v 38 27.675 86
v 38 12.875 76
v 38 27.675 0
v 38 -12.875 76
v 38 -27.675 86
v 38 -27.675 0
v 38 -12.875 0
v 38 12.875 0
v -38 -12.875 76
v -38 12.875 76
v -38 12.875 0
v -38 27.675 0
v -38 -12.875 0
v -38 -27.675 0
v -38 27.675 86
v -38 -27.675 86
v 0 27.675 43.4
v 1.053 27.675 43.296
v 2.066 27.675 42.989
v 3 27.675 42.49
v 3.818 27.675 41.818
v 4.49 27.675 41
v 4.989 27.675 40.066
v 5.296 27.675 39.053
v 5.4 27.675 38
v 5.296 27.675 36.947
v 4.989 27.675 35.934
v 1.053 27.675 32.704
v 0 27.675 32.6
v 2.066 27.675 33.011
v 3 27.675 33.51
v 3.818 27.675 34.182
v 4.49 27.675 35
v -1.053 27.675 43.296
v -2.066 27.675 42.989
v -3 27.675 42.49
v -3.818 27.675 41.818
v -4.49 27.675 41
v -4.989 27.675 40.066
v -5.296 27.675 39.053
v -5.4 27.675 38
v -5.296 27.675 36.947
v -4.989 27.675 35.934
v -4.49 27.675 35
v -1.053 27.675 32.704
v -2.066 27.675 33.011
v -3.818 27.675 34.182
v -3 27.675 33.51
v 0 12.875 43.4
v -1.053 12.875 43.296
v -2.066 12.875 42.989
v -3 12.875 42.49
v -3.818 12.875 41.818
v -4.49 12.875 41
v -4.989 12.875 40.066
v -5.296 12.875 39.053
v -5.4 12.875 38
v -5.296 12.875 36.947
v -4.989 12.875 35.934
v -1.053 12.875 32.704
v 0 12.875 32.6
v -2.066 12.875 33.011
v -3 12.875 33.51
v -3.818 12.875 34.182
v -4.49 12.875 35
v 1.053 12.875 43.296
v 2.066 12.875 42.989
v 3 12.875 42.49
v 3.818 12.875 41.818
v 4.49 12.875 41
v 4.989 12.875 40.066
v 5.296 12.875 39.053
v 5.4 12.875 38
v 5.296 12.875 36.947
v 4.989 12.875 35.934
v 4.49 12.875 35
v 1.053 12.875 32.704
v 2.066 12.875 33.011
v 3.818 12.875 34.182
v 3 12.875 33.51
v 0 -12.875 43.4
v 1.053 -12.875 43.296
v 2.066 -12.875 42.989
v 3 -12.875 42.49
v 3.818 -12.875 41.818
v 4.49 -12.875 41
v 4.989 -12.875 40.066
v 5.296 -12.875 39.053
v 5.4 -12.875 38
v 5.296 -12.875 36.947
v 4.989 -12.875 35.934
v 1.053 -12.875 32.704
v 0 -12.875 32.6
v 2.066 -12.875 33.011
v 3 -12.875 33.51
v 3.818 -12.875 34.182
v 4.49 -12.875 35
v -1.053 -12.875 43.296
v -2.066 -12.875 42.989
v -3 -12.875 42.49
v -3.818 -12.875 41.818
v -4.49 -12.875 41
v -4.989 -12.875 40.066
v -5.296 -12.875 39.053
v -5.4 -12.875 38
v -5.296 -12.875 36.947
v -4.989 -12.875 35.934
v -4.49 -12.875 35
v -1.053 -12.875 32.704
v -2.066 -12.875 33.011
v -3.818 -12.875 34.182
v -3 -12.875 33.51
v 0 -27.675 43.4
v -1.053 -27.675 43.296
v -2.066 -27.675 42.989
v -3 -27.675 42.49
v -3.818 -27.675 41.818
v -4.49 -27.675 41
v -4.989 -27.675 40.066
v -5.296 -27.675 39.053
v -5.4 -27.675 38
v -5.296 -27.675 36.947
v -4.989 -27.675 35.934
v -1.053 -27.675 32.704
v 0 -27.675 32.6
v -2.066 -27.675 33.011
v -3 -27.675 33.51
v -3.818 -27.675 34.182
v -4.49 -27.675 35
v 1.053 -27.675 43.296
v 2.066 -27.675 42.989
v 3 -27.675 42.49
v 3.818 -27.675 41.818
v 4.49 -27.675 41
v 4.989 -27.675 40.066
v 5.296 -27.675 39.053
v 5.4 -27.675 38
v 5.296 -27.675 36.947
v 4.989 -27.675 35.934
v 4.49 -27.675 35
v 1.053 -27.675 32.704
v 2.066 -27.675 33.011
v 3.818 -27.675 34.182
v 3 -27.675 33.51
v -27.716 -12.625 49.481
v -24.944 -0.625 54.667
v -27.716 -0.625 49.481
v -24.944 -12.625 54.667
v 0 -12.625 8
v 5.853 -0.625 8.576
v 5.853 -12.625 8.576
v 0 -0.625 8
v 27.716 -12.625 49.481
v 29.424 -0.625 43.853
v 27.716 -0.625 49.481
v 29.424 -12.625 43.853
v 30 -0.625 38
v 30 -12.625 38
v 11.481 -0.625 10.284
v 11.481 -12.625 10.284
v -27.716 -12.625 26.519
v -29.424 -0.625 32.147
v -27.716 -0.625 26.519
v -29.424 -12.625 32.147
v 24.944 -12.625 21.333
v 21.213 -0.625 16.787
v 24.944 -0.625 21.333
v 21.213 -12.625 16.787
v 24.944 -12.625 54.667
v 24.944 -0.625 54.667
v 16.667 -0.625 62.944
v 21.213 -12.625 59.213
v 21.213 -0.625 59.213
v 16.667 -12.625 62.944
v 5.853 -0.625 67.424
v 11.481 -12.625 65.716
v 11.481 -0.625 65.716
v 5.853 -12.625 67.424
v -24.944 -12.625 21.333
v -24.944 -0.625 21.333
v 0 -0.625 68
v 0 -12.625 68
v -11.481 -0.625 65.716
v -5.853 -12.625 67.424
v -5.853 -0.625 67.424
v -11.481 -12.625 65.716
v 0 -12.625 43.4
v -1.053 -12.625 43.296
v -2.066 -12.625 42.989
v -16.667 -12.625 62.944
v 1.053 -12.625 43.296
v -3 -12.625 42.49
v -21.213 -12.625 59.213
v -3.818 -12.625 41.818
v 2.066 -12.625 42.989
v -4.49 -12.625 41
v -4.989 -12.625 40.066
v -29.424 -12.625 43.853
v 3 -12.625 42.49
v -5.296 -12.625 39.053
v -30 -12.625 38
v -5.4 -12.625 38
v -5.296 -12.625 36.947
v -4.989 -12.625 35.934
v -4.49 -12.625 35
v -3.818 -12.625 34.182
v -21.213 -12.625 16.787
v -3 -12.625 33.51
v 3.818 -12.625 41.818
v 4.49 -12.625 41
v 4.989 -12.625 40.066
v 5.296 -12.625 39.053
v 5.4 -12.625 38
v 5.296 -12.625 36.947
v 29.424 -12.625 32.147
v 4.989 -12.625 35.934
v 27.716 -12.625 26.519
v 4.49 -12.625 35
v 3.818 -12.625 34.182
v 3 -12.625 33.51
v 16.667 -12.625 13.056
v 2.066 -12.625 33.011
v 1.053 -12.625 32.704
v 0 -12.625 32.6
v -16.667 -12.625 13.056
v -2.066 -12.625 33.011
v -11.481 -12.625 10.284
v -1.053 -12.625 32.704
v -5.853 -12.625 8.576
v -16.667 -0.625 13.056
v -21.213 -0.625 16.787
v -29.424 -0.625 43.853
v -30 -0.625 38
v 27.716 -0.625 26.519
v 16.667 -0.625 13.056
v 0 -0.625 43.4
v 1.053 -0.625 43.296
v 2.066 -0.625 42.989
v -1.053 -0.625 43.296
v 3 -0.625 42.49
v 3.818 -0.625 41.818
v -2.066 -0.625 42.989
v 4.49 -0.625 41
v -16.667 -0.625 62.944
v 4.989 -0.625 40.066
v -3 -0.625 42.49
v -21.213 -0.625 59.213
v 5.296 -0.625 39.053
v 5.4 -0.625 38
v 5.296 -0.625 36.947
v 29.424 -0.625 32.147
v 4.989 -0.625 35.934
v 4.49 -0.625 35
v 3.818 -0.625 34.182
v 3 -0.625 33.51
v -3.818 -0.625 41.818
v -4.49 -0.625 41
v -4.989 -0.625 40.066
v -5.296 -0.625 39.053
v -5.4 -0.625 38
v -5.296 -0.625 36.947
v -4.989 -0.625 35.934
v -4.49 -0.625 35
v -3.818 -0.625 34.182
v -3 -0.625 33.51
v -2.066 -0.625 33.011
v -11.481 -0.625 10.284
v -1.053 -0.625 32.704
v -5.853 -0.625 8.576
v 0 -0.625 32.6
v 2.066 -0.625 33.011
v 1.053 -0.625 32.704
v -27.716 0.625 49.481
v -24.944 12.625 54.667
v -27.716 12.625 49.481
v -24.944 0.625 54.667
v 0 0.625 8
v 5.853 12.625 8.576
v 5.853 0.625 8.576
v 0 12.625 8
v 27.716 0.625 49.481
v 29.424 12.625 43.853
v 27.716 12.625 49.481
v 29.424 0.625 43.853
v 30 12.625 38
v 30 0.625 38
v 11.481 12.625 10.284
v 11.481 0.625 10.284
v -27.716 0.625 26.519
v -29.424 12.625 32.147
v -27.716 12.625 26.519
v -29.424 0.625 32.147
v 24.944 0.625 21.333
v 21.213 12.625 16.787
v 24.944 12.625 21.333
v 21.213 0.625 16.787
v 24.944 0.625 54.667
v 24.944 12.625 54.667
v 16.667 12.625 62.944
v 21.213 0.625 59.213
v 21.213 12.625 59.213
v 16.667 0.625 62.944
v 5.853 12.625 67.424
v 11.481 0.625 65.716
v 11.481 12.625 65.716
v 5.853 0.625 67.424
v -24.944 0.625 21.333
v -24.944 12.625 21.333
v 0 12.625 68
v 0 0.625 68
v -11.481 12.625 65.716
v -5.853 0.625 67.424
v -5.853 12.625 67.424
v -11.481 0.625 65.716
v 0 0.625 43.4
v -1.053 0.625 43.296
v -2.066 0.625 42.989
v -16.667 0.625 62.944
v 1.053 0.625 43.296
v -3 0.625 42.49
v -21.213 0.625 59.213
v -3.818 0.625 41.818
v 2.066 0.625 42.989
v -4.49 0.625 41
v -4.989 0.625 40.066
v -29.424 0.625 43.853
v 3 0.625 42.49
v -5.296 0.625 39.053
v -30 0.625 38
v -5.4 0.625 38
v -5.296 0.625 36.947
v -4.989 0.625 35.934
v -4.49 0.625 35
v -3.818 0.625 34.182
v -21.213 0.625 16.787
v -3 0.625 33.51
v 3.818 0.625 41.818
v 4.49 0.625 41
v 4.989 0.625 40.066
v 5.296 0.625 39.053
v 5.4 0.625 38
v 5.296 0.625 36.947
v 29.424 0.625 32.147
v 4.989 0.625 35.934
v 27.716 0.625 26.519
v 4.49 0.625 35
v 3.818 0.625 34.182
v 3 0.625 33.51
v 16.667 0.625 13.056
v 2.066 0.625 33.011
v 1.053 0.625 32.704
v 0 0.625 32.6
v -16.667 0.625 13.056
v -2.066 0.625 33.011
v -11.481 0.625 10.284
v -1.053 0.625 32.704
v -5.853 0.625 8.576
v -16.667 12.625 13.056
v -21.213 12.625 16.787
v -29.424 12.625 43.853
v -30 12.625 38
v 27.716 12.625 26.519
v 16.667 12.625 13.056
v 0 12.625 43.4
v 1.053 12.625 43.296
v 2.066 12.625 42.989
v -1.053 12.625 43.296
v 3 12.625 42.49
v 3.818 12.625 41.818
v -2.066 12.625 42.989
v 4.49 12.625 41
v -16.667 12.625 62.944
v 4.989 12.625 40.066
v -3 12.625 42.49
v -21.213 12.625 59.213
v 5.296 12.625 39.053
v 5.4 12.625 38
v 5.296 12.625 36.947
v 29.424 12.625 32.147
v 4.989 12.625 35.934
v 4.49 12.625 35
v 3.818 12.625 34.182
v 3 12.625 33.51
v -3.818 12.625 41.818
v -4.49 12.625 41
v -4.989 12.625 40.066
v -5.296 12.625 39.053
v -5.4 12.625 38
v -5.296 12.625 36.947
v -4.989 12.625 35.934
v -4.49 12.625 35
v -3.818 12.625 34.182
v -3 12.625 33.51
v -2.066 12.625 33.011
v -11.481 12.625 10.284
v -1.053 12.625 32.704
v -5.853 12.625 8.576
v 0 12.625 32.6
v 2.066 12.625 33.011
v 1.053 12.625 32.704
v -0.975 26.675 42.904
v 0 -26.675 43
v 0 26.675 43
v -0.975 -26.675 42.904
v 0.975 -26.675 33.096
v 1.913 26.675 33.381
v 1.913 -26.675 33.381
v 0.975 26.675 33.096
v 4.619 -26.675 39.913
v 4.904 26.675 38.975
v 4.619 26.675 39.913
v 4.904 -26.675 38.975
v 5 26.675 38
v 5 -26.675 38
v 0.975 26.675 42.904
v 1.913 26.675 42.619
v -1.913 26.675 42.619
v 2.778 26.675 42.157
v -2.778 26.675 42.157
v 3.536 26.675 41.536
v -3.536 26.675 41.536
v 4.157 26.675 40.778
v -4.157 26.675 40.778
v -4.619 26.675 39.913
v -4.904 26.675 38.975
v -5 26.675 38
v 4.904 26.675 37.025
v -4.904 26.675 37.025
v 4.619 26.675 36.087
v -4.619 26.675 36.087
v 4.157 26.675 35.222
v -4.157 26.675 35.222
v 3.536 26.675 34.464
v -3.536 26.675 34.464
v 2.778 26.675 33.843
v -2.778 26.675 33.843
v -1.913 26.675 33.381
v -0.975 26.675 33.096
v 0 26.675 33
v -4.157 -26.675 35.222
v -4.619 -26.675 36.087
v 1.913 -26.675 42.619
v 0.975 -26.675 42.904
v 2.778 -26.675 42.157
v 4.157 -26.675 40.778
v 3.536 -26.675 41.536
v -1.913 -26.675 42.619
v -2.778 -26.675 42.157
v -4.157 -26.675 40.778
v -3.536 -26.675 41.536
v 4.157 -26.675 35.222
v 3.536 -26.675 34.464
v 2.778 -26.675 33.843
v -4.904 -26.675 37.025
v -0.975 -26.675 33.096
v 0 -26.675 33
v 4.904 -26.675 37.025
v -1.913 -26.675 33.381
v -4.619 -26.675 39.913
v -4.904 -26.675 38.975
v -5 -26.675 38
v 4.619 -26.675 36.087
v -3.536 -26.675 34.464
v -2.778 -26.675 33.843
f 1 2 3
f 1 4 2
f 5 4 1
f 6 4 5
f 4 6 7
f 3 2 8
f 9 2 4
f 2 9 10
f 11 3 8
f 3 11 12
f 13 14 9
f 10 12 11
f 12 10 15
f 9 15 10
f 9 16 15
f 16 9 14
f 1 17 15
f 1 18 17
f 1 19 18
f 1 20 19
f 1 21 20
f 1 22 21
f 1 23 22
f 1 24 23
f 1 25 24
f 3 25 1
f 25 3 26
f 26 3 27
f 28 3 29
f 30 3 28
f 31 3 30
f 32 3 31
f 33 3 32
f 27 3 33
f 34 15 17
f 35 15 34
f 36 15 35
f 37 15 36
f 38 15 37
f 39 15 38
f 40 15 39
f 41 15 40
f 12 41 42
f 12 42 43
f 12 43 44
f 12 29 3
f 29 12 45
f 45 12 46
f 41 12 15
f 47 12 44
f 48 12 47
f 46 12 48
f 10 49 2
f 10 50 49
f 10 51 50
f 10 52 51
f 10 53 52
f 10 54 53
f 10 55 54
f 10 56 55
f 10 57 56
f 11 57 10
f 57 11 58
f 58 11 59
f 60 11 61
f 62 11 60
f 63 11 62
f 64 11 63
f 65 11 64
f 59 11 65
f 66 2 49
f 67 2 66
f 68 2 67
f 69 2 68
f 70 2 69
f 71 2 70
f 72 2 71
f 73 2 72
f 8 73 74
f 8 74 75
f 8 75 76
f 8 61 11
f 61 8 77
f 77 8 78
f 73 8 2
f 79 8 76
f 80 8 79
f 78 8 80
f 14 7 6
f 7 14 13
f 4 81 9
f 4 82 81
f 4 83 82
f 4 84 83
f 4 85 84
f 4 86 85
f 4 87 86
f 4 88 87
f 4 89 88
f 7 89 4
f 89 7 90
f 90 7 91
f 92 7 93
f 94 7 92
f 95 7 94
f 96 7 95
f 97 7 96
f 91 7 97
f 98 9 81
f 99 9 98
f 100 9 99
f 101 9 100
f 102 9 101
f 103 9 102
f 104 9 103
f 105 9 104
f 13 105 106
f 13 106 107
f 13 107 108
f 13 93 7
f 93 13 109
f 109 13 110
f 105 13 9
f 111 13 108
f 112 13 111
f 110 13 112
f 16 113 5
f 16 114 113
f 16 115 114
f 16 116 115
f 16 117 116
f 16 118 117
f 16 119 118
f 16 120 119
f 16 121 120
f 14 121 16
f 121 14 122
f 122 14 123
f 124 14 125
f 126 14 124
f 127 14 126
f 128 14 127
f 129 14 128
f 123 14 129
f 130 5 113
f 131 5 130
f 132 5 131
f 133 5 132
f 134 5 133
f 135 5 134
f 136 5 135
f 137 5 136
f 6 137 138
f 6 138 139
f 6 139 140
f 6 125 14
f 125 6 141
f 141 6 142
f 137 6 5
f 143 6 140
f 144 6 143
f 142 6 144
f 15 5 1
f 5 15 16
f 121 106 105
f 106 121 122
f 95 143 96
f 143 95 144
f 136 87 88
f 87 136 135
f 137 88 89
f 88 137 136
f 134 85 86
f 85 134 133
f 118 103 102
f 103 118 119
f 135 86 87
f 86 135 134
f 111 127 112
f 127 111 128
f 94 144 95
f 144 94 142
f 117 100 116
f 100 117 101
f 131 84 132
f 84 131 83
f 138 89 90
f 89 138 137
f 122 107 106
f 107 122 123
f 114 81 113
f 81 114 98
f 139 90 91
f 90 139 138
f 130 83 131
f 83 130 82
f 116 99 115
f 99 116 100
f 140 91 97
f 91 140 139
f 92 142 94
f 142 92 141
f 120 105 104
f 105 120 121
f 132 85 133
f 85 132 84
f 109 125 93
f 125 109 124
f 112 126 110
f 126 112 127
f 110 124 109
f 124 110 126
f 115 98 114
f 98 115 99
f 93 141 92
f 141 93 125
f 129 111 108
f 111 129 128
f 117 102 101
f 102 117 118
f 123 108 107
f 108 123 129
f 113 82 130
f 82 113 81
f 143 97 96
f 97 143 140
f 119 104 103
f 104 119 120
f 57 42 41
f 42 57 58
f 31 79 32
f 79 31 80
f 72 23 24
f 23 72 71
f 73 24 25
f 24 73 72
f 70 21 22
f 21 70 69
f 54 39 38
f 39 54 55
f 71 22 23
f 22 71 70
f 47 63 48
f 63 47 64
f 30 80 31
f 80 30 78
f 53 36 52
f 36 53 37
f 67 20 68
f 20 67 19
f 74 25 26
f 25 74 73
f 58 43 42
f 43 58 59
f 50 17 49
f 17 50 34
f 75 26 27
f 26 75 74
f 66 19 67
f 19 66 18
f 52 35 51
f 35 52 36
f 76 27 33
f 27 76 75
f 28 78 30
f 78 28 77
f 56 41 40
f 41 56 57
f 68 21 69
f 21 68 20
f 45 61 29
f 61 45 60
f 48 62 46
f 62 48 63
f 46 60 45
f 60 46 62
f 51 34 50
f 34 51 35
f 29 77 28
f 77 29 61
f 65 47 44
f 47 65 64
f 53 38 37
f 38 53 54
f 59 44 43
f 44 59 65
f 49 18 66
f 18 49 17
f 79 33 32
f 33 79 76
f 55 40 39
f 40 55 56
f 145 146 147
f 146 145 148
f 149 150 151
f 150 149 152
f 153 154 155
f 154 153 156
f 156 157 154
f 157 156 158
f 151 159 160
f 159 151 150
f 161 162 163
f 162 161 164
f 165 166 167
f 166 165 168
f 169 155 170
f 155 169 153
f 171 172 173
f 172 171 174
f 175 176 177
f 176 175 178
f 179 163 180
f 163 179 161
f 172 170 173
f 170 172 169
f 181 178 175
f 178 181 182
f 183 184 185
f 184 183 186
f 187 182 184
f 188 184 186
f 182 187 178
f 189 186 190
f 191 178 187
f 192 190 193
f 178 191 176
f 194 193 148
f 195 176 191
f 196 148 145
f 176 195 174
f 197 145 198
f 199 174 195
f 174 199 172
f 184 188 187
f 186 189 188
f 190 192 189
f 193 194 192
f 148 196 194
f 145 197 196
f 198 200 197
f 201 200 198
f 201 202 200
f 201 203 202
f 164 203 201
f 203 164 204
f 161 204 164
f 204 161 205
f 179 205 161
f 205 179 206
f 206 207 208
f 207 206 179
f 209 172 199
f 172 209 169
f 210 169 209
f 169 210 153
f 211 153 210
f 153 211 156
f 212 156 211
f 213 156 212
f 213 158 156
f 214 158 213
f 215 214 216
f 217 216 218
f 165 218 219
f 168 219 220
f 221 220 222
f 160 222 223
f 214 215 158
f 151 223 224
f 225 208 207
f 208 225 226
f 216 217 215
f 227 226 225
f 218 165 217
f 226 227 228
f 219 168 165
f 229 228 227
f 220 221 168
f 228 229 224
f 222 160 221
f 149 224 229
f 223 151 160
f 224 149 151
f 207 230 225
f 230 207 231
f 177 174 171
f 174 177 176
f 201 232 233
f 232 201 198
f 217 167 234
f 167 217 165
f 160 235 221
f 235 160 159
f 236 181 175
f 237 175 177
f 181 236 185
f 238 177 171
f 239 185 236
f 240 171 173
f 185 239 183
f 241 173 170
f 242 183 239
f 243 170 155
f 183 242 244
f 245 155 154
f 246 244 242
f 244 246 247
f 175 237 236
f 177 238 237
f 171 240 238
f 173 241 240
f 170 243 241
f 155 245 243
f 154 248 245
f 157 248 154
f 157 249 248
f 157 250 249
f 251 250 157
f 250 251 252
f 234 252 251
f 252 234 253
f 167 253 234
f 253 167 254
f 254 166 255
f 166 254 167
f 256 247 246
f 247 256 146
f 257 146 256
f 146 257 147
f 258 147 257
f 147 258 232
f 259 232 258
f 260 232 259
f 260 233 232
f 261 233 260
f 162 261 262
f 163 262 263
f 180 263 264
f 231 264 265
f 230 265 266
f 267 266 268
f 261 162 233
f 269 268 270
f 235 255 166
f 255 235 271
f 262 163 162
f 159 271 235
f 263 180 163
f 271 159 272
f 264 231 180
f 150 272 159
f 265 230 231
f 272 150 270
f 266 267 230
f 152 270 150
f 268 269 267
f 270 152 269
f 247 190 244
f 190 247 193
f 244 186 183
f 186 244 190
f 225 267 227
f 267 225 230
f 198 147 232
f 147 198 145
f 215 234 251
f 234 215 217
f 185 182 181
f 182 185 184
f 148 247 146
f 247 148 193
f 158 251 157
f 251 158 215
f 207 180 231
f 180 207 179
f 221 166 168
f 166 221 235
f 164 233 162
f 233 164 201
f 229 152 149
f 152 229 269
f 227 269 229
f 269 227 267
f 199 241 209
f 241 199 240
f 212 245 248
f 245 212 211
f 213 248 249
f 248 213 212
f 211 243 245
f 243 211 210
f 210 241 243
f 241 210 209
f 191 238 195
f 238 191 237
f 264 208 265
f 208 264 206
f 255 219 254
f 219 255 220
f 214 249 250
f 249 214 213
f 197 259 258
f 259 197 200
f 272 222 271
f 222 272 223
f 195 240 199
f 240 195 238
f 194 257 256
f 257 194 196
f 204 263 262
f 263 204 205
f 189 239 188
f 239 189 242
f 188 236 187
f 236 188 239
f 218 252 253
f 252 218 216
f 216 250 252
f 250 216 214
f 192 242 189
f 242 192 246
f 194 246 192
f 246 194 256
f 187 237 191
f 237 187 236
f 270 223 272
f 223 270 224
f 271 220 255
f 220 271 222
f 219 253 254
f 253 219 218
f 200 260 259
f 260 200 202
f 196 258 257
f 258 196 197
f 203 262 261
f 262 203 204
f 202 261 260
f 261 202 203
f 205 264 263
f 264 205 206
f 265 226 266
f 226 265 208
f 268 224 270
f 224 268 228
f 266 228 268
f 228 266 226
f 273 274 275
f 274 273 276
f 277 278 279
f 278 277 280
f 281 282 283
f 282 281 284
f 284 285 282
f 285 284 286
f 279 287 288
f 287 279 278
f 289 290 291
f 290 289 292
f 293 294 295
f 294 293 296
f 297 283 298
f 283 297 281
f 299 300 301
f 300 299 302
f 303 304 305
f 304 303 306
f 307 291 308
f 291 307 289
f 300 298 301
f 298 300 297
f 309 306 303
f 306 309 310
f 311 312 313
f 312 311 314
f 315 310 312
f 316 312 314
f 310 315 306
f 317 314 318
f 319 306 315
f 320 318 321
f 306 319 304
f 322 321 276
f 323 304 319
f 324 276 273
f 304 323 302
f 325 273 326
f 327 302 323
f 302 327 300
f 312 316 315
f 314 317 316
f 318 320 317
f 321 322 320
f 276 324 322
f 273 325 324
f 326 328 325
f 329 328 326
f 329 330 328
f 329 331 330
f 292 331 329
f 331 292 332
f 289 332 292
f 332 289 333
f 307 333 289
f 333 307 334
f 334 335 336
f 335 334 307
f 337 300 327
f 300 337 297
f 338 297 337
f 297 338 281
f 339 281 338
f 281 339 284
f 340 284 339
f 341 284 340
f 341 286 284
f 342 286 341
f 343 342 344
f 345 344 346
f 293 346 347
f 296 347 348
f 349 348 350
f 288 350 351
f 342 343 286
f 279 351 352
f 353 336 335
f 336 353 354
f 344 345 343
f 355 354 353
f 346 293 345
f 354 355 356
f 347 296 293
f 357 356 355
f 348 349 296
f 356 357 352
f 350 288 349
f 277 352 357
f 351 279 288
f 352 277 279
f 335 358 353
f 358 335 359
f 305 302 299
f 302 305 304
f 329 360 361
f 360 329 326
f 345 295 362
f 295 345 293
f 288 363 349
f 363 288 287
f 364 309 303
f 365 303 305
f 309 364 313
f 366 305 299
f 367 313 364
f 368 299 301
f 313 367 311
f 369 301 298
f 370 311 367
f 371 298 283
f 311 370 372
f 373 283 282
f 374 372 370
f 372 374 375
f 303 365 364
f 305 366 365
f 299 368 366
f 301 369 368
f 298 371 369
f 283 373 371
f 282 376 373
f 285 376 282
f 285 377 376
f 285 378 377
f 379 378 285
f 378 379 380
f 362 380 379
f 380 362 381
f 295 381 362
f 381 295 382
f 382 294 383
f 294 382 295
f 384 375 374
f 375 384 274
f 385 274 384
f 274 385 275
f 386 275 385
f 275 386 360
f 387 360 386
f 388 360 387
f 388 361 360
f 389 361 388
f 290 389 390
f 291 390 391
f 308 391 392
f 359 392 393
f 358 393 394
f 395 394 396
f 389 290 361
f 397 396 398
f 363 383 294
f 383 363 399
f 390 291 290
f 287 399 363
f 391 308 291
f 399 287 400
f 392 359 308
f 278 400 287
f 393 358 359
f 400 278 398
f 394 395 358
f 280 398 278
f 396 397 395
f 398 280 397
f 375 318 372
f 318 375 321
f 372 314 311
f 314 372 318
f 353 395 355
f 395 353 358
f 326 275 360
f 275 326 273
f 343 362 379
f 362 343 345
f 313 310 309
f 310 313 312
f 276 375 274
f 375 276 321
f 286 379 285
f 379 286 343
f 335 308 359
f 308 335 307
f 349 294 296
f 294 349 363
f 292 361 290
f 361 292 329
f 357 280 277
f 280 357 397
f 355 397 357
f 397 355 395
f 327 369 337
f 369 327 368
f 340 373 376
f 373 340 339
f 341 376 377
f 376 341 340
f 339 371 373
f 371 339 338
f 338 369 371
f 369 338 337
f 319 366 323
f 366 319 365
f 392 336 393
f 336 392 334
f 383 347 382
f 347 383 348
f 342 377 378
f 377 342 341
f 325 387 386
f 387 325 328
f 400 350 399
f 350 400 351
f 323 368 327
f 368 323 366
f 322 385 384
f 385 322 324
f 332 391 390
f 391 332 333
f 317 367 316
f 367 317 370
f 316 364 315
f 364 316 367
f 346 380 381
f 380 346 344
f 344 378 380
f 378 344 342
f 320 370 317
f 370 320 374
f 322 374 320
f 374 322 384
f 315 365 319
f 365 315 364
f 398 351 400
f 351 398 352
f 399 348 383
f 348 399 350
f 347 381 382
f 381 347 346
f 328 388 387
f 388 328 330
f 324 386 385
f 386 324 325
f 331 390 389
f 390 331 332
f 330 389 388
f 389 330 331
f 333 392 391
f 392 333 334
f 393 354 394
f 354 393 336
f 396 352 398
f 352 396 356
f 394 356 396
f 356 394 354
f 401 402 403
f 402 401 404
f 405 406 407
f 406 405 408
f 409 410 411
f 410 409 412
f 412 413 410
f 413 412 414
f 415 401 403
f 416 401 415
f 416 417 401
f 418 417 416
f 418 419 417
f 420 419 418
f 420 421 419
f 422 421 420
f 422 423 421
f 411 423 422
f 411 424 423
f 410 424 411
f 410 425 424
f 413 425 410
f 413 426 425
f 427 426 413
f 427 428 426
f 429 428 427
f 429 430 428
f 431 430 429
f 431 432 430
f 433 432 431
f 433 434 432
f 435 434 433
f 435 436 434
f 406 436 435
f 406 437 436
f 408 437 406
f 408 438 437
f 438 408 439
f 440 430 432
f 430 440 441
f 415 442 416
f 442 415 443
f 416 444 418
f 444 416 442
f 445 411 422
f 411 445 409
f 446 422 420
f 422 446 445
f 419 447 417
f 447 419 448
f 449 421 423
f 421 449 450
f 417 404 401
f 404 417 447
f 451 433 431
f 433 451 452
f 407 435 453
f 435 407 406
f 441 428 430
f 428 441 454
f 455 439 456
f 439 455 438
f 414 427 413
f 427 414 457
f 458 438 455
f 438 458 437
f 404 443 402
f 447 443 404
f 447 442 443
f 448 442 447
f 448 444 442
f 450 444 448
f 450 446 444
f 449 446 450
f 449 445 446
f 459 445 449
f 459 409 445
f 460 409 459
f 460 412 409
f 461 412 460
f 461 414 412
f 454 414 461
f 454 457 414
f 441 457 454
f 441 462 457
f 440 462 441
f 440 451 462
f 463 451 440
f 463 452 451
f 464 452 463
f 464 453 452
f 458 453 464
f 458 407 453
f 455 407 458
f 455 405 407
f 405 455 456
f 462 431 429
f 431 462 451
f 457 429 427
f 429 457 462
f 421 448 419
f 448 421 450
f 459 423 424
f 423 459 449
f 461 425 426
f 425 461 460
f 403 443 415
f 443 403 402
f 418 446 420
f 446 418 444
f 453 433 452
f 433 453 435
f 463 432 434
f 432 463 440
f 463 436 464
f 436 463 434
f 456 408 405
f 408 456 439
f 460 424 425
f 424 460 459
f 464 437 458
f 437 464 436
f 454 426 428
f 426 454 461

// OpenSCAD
$fn = 32;

// ------------------------------------------------------------------------
// Trolley wheel set: wheels d60, fork 76 mm tall
// Every part is its own module, assembly() places every instance.
// ------------------------------------------------------------------------

// --- part 1 ---
module trolley_fork() {
  difference() {
    union() {
      translate([-38, 12.875, 0]) cube([76, 14.8, 76]);
      translate([-38, -27.675, 0]) cube([76, 14.8, 76]);
      translate([-38, -27.675, 76]) cube([76, 55.35, 10]);
    }
    translate([0, -20.275, 38]) rotate([90, 0, 0]) cylinder(h = 16.8, d = 10.8, center = true);
    translate([0, 20.275, 38]) rotate([90, 0, 0]) cylinder(h = 16.8, d = 10.8, center = true);
  }
}

// --- part 2 ---
module trolley_wheel() {
  difference() {
      translate([0, 0, 0]) cylinder(h = 12, d = 60);
      translate([0, 0, -1]) cylinder(h = 14, d = 10.8);
    }
}

// --- part 3 ---
module trolley_axle() {
  translate([0, 0, -26.675]) cylinder(h = 53.35, d = 10);
}

// --- assembly ---
module assembly() {
  color([0.80, 0.24, 0.20]) translate([0, 0, 0]) rotate([0, 0, 0]) trolley_fork();
  color([0.20, 0.45, 0.75]) translate([0, -0.625, 38]) rotate([90, 0, 0]) trolley_wheel();
  color([0.25, 0.62, 0.32]) translate([0, 12.625, 38]) rotate([90, 0, 0]) trolley_wheel();
  color([0.92, 0.70, 0.18]) translate([0, 0, 38]) rotate([90, 0, 0]) trolley_axle();
}

assembly();
